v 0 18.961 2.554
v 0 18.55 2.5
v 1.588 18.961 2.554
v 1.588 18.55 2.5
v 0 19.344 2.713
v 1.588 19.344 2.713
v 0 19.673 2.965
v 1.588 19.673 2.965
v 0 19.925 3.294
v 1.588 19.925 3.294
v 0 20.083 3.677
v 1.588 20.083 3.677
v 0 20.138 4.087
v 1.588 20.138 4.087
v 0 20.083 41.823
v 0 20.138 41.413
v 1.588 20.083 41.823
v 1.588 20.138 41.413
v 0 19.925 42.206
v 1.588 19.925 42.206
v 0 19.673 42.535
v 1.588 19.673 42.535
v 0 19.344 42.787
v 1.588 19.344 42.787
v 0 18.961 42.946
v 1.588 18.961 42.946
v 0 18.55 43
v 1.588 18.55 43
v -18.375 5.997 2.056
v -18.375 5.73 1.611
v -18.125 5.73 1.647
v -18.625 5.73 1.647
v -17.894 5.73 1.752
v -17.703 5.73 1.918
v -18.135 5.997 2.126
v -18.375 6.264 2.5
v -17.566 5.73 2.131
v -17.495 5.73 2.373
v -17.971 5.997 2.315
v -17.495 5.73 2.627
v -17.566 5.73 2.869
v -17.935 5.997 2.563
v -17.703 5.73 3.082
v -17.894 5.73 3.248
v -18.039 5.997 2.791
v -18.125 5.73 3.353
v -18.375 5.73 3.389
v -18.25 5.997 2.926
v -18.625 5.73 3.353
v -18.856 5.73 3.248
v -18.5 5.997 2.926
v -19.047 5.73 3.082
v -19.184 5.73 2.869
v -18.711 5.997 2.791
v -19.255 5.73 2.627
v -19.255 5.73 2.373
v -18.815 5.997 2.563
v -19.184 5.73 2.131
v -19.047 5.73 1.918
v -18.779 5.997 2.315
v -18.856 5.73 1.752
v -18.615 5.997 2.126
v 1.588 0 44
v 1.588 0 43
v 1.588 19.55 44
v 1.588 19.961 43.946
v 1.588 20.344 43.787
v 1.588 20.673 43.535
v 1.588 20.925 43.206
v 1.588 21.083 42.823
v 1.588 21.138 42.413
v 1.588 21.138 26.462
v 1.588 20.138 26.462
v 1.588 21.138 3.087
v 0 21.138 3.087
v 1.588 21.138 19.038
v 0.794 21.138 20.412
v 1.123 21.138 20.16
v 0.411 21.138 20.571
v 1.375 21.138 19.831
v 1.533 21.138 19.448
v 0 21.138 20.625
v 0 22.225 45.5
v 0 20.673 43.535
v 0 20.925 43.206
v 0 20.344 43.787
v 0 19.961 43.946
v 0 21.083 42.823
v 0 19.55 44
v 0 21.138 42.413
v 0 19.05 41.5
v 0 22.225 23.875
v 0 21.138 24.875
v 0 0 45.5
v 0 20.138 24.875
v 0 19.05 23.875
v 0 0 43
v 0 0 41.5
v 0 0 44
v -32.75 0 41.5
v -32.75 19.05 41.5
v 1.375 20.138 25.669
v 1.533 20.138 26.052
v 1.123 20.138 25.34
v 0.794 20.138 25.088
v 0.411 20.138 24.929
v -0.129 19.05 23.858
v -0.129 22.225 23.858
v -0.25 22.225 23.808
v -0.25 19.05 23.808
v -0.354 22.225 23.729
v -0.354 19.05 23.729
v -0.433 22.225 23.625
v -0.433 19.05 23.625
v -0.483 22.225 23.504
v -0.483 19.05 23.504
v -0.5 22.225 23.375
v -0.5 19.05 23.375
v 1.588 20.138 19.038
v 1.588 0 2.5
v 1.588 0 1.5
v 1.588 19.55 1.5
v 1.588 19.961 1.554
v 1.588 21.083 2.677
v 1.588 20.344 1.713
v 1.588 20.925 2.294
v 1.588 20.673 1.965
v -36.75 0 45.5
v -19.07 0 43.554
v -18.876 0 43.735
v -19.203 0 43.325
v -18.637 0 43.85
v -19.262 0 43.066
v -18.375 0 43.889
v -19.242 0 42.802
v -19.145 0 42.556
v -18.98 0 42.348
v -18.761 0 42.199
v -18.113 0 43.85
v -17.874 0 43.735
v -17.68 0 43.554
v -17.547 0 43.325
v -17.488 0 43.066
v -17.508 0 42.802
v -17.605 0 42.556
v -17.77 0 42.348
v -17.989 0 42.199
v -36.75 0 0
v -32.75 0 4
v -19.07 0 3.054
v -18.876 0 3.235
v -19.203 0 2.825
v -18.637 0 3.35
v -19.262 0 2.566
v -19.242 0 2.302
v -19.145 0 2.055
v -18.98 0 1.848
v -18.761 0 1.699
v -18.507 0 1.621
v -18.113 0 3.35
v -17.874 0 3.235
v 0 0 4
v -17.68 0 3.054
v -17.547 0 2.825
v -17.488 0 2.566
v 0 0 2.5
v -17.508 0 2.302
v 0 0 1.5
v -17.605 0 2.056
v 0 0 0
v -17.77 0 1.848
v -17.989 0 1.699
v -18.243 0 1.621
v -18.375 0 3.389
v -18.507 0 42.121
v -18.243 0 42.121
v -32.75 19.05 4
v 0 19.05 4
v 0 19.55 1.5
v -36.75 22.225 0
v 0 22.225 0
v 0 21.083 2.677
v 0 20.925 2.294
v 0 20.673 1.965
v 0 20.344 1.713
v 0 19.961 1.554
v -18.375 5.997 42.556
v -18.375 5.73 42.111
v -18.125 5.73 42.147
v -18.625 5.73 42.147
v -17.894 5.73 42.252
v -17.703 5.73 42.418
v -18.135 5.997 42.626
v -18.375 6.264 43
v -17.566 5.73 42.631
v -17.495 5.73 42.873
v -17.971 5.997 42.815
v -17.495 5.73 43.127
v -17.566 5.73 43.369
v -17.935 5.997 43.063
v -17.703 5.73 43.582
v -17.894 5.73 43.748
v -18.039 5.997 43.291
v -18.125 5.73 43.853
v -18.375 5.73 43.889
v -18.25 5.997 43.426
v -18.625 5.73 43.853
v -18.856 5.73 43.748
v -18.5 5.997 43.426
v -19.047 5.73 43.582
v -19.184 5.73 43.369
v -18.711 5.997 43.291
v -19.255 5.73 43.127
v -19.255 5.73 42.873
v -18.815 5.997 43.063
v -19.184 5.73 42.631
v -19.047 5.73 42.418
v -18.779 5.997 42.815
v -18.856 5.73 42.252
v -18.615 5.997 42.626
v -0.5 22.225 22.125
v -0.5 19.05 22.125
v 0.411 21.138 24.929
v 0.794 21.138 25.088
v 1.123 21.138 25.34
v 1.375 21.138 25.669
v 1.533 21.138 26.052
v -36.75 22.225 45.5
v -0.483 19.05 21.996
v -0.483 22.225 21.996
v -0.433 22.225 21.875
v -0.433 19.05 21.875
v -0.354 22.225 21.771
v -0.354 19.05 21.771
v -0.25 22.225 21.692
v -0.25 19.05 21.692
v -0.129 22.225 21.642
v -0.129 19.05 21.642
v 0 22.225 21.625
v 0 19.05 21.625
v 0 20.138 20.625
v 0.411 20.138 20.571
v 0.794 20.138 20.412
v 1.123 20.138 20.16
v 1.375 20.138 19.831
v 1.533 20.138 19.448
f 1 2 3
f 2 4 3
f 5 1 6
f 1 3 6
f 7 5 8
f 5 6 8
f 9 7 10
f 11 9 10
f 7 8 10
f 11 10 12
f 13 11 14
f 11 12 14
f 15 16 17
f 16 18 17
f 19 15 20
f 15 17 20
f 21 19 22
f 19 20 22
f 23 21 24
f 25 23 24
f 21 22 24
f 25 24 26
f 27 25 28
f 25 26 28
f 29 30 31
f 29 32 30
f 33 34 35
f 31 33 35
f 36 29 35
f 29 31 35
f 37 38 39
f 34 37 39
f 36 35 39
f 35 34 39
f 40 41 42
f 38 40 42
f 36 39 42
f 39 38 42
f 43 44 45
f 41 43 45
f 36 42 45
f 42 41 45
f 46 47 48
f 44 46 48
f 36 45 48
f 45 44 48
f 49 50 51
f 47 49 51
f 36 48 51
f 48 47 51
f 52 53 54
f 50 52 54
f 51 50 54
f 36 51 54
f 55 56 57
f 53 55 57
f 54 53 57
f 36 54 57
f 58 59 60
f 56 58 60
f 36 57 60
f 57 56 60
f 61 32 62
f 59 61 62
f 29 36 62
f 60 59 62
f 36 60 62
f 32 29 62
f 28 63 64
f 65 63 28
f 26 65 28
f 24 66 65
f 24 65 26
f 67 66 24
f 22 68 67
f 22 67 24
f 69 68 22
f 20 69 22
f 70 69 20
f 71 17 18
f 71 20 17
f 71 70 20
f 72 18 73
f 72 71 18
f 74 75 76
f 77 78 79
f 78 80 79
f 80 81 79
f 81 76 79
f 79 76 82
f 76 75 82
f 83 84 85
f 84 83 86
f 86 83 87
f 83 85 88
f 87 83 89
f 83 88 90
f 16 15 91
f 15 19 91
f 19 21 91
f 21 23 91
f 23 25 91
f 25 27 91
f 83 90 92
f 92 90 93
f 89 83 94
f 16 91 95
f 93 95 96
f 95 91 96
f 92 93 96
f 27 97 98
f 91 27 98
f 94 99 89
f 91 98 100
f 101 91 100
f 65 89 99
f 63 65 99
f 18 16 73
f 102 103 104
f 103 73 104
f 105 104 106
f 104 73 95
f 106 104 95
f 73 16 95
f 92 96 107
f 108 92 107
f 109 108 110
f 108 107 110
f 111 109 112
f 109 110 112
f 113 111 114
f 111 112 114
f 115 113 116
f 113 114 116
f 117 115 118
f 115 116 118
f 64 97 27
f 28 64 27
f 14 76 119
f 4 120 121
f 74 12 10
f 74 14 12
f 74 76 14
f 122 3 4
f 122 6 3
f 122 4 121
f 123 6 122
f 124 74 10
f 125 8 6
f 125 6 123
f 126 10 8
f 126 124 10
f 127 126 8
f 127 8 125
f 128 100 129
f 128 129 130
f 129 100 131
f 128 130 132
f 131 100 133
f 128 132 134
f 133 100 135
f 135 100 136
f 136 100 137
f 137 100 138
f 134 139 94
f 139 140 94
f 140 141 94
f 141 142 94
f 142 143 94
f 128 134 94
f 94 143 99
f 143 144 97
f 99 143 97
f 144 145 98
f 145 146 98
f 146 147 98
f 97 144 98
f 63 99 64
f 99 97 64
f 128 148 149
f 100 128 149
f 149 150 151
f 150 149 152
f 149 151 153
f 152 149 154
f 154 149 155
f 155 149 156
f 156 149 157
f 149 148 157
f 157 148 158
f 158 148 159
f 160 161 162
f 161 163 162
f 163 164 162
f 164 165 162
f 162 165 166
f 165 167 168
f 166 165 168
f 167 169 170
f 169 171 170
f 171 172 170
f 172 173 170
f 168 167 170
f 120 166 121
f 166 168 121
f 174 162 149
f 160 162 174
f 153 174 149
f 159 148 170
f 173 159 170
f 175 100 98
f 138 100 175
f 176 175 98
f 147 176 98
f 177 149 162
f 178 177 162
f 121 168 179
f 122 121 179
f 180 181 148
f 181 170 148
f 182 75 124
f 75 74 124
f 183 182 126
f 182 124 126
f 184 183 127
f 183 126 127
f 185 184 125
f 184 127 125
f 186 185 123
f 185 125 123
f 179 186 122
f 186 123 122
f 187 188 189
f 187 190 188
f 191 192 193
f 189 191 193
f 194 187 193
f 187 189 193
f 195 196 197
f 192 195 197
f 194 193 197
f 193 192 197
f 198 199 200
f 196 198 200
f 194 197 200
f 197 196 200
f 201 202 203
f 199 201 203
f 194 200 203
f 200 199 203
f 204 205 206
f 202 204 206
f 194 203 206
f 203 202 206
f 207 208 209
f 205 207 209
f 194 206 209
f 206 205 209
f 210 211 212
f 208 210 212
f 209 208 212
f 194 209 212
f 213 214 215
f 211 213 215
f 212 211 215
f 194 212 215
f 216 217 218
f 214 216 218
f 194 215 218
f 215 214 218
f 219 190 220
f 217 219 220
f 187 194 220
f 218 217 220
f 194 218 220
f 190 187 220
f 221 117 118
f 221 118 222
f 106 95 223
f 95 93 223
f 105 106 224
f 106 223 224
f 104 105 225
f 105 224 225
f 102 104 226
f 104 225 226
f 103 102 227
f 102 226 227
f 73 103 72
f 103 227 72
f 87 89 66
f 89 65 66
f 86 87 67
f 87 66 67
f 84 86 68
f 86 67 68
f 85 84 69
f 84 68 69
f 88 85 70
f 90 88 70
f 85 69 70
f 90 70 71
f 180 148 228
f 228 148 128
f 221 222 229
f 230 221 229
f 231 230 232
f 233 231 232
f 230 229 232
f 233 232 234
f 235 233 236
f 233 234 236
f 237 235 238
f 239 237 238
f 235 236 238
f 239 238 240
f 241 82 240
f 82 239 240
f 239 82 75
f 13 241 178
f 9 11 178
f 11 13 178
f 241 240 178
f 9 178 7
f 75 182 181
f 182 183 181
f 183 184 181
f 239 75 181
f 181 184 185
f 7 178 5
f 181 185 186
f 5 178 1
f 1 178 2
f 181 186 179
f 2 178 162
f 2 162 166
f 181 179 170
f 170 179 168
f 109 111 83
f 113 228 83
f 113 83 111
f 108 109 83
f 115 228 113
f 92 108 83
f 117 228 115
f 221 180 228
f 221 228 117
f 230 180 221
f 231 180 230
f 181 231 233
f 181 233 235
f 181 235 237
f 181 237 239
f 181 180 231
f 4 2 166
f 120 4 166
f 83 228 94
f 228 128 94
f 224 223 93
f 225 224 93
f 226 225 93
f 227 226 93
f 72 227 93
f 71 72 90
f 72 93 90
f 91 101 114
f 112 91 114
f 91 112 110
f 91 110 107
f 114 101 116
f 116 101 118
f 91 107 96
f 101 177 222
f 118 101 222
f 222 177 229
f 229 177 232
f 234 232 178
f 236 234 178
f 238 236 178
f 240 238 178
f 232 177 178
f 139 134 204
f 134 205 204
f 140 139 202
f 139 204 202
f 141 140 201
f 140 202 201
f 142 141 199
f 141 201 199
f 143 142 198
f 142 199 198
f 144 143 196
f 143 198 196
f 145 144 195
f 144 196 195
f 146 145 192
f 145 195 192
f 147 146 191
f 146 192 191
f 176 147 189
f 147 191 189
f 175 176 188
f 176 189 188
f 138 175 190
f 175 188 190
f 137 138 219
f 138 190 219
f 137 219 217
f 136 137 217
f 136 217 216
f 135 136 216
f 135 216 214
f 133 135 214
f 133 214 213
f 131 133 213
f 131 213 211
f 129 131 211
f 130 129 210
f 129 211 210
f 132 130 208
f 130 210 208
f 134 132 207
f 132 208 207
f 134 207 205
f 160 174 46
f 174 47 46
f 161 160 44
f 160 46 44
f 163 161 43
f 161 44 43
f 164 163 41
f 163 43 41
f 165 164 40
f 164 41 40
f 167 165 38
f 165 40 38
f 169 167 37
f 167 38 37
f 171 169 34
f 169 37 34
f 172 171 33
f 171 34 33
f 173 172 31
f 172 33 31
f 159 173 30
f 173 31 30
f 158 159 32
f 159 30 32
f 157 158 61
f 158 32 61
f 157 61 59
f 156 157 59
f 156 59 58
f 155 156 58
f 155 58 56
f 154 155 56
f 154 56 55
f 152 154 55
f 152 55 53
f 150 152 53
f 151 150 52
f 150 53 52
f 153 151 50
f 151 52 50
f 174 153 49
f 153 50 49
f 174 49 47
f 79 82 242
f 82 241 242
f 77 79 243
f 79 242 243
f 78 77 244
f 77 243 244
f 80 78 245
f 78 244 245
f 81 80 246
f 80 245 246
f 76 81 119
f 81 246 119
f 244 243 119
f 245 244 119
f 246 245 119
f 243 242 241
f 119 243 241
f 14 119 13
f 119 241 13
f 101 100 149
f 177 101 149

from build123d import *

# Parameters (mm, degrees)
WALL_DEPTH                = 19.05
ROOF_START                = 19.05
ROOF_DEPTH                = 3.175
F_2_56_TAPPED_HOLE1_D     = 1.778
F_2_56_TAPPED_HOLE1_DEPTH = 5.73
F_2_56_TAPPED_HOLE1_TIP   = 0.53416509
BOSS_EXTRUDE1_DEPTH       = 1.5875
FILLET1_R                 = 1.5875


with BuildPart() as part:
    # MainSketch → Wall (new body)
    with BuildSketch(Plane(origin=(0, 0, 0), x_dir=(1, 0, 0), z_dir=(0, 1, 0))):
        Polygon((-32.75, -4), (0, -4), (0, 0), (-36.75, 0), (-36.75, -45.5), (0, -45.5), (0, -41.5), (-32.75, -41.5), align=None)
    extrude(amount=WALL_DEPTH)

    # MainSketch<3> → Roof (add)
    with BuildSketch(Plane(origin=(0, 0, 0), x_dir=(1, 0, 0), z_dir=(0, 1, 0)).offset(ROOF_START)):
        with BuildLine():
            Line((0, -21.625), (0, 0))
            Line((0, 0), (-36.75, 0))
            Line((-36.75, 0), (-36.75, -45.5))
            Line((-36.75, -45.5), (0, -45.5))
            Line((0, -45.5), (0, -23.875))
            ThreePointArc((0, -23.875), (-0.353553391, -23.728553391), (-0.5, -23.375))
            Line((-0.5, -23.375), (-0.5, -22.125))
            ThreePointArc((-0.5, -22.125), (-0.353553391, -21.771446609), (0, -21.625))
        make_face()
    extrude(amount=ROOF_DEPTH)

    # #2-56 Tapped Hole1
    with Locations(Plane(origin=(-18.375, 0, 43), x_dir=(0, 0, -1), z_dir=(0, -1, 0))):
        with Locations((0, 0), (40.5, 0)):
            Hole(F_2_56_TAPPED_HOLE1_D / 2, depth=F_2_56_TAPPED_HOLE1_DEPTH)
            with Locations((0, 0, -(F_2_56_TAPPED_HOLE1_DEPTH + F_2_56_TAPPED_HOLE1_TIP / 2))):  # 118° drill point
                Cone(0, F_2_56_TAPPED_HOLE1_D / 2, F_2_56_TAPPED_HOLE1_TIP, mode=Mode.SUBTRACT)

    # Sketch3 → Boss-Extrude1 (add)
    with BuildSketch(Plane(origin=(0, 0, 0), x_dir=(0, 0, -1), z_dir=(1, 0, 0))):
        Polygon((-44, 21.1375), (-44, 0), (-43, 0), (-43, 20.1375), (-24.875, 20.1375), (-24.875, 21.1375), align=None)
        Polygon((-1.5, 21.1375), (-20.625, 21.1375), (-20.625, 20.1375), (-2.5, 20.1375), (-2.5, 0), (-1.5, 0), align=None)
    extrude(amount=BOSS_EXTRUDE1_DEPTH)

    # Fillet1
    fillet1_edges = [part.edges().sort_by_distance(p)[0] for p in [
        (0.79375, 20.1375, 43),
        (0.79375, 21.1375, 44),
        (0.79375, 20.1375, 2.5),
        (0.79375, 21.1375, 1.5),
        (1.5875, 20.6375, 20.625),
        (1.5875, 20.6375, 24.875),
    ]]
    fillet(fillet1_edges, radius=FILLET1_R - 0.0001)  # a hair under: the kernel refuses the full size


solid = part.part
